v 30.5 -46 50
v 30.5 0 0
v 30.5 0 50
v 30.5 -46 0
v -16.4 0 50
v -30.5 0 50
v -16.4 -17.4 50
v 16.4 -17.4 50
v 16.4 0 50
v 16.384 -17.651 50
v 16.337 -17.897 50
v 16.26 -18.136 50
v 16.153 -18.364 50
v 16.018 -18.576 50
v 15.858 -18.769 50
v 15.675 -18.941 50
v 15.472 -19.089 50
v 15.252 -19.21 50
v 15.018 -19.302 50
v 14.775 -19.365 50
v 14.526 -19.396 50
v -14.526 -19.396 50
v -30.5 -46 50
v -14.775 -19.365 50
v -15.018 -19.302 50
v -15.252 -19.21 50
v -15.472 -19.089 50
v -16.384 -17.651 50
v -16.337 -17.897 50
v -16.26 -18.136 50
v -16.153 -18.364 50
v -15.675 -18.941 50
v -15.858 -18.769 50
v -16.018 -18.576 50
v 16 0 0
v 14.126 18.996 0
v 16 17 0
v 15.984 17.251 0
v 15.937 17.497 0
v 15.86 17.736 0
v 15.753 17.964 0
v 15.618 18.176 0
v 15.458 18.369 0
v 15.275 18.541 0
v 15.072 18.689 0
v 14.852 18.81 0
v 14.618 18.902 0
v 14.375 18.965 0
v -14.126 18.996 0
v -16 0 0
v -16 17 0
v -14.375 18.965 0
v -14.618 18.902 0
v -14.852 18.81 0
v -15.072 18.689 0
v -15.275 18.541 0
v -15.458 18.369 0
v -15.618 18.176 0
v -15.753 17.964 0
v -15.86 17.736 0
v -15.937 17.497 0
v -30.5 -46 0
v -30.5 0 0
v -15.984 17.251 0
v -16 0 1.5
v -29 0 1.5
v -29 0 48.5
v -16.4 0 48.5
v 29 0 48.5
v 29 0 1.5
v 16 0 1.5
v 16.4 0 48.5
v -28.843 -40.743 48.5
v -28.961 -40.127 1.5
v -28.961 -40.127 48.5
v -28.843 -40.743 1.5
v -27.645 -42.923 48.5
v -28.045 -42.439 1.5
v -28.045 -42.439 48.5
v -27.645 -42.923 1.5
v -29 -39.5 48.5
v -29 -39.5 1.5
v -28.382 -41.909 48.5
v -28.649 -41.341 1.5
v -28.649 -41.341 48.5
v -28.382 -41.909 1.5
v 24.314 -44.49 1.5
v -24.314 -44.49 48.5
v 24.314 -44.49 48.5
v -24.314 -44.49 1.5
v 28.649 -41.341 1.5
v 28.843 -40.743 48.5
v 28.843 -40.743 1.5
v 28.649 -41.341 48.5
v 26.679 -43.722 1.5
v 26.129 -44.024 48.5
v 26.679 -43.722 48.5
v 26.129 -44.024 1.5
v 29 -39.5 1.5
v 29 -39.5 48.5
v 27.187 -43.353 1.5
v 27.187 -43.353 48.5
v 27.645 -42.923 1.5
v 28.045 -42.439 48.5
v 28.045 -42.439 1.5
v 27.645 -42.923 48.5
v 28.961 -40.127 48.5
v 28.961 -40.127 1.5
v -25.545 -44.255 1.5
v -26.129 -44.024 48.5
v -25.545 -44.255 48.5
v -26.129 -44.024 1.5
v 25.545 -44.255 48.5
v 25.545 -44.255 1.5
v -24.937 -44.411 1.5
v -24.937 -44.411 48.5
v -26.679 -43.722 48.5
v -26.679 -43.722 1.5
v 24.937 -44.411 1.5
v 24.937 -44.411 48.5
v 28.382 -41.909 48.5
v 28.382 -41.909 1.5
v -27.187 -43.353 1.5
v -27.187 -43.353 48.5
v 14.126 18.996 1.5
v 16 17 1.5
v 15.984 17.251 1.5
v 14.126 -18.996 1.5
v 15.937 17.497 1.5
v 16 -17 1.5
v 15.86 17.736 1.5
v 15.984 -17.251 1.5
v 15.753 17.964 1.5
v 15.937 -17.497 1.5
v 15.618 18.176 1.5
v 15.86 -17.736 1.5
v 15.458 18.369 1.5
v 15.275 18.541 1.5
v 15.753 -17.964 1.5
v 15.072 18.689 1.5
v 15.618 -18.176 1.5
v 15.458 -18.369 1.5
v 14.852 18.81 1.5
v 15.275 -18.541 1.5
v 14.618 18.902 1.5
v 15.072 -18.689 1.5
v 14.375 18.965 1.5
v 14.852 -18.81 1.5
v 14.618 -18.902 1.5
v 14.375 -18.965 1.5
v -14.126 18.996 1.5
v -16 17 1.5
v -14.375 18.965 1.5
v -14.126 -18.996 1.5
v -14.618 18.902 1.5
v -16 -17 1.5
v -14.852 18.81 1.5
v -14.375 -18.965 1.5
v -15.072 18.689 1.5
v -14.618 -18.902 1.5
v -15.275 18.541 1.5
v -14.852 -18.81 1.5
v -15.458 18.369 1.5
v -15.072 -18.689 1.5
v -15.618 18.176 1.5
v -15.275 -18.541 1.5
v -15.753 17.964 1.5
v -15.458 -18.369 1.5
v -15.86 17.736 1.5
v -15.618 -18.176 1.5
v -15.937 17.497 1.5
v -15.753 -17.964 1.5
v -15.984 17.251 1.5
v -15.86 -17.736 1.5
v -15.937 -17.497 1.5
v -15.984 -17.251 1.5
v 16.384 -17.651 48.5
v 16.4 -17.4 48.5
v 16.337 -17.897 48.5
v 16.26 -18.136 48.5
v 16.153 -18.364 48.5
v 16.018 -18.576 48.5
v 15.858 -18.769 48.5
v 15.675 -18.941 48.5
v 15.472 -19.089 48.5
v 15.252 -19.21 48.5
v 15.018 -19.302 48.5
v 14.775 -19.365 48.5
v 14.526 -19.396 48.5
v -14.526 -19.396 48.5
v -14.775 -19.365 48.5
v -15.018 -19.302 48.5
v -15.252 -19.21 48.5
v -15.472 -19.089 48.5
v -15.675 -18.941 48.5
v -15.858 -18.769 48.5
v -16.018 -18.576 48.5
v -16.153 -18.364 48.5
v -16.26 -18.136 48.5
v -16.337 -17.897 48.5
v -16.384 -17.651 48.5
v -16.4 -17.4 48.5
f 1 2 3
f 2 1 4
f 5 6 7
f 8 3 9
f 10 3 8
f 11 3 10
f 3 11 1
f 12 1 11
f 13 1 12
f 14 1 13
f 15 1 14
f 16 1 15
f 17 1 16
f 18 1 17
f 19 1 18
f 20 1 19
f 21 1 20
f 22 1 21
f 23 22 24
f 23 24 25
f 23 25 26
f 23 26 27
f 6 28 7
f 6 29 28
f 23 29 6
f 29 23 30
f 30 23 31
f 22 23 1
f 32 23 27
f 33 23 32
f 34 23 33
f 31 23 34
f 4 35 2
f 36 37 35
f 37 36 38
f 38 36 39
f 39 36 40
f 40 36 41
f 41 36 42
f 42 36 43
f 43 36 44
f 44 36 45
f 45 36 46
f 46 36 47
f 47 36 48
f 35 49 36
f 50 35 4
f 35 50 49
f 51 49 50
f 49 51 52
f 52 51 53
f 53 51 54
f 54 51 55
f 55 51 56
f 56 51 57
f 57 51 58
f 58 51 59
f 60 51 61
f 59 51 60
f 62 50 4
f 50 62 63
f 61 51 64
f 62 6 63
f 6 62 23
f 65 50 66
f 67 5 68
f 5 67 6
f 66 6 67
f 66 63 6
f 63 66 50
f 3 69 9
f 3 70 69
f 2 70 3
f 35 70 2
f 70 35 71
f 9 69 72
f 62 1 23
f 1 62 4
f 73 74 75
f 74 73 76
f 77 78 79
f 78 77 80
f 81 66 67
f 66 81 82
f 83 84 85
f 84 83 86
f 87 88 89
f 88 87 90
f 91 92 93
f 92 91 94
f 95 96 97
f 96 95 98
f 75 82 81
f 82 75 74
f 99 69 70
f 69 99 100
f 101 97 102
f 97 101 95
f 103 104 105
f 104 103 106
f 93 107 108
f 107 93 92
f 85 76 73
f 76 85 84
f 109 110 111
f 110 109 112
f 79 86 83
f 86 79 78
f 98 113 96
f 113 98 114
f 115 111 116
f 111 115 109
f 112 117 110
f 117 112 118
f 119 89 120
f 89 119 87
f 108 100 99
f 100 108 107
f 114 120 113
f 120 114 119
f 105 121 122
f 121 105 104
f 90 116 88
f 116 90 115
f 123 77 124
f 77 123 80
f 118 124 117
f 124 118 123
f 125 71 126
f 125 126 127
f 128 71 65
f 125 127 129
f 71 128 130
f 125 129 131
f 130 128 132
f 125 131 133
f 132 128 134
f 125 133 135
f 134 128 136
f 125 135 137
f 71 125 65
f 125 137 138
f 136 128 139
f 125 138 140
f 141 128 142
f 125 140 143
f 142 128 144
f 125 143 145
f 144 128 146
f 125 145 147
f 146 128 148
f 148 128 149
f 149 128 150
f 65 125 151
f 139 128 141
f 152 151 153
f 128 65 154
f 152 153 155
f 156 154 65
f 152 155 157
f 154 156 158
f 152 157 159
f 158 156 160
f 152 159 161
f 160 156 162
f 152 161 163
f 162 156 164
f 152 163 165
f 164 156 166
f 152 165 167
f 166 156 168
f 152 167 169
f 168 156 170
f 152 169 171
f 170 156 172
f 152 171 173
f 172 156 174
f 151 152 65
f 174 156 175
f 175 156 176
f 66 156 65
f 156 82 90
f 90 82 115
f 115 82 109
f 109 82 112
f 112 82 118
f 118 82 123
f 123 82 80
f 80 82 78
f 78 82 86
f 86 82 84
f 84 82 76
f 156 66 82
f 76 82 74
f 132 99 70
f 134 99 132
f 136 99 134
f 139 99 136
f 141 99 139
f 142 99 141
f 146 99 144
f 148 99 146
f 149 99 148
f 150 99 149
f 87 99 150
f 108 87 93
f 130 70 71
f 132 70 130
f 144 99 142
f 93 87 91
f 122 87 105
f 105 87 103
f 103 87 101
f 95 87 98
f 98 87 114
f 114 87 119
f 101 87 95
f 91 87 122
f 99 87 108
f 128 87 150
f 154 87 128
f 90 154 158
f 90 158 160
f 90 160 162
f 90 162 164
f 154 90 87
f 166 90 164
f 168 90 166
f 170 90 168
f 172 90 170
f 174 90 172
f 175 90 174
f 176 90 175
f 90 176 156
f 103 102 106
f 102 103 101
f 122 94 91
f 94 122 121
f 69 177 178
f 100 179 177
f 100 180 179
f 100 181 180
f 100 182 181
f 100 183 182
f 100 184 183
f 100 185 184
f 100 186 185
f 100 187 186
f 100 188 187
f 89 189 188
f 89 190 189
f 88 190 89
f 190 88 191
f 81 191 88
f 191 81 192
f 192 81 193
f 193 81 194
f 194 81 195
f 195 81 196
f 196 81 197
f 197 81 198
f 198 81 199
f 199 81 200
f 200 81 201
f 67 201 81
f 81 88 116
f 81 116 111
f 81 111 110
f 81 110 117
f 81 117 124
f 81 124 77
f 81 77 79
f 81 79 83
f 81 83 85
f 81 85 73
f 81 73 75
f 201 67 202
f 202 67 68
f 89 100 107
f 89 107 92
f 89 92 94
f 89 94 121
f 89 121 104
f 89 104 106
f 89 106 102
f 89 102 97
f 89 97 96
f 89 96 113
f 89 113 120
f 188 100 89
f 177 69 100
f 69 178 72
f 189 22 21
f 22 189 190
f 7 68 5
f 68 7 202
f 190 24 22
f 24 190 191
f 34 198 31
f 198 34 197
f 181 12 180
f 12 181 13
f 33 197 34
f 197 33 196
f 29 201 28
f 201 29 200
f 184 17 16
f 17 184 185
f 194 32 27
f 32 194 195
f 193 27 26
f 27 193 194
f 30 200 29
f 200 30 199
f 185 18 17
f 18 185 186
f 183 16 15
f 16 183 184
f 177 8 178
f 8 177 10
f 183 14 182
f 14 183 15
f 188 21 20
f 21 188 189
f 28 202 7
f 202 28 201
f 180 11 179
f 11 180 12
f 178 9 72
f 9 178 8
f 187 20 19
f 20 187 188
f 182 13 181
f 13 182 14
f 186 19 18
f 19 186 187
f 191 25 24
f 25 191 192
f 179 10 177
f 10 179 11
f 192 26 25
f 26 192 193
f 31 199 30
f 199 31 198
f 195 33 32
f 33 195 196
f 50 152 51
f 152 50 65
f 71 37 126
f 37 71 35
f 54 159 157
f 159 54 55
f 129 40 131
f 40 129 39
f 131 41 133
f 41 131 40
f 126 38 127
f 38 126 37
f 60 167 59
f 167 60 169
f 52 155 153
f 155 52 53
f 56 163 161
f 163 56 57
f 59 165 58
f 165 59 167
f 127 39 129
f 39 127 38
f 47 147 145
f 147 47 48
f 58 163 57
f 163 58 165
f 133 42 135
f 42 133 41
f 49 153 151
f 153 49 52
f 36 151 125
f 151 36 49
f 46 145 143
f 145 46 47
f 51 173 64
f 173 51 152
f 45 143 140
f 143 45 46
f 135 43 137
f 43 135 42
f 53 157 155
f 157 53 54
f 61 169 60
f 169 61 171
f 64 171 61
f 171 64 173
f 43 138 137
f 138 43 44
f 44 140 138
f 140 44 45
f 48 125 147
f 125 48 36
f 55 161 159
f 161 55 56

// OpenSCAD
/***************************************************
*** (c) 2018 by saarbastler.de
***************************************************/

$fn=50;

// the inner width of the box = card width
cardWidth= 57;

// the inner height of the box = card height
cardHeight= 88;

// the inner depth of the box = deck of card depth
cardThick= 46;//33;

// the corner radius
radius= 5;

// the wall thickness
wall= 1.5;

// card tolerance
tolerance= 0.5;

// clip tolerance
toleranceClip= 0.4;


module cubeRC(wx, wy, wz, rad)
{
  hull()
  {
    translate([-wx/2+radius,-wy/2+radius,0]) cylinder(r=rad, h=wz);
    translate([ wx/2-radius,-wy/2+radius,0]) cylinder(r=rad, h=wz);
    translate([-wx/2+radius, wy/2-radius,0]) cylinder(r=rad, h=wz);
    translate([ wx/2-radius, wy/2-radius,0]) cylinder(r=rad, h=wz);
  }
}

module box()
{
  bx= cardWidth +2*wall +2*tolerance;
  by= cardHeight+2*wall +2*tolerance;
  bz= cardThick +2*wall +2*tolerance;
  
  difference()
  {
    translate([-bx/2,-by/2,0]) cube([bx,by*.5,bz]);
    
    translate([0,0,wall]) cubeRC(cardWidth+2*tolerance,cardHeight+2*tolerance,cardThick+2*tolerance,radius);
    
    translate([0,0,bz-wall-1]) cubeRC(2*cardWidth/3+2*toleranceClip,cardHeight*.5+2*toleranceClip,3*wall,2);
  }
  
  *translate([-cardWidth/4,0,0]) cube([cardWidth/2,cardHeight*.1,wall]);
  cubeRC(2*cardWidth/3,cardHeight*.5,wall,2);
}

*color("darkgrey") translate([0,0,wall+tolerance/2]) cubeRC(cardWidth,cardHeight,cardThick,radius);
//rotate([90,0,0]) 
box();
